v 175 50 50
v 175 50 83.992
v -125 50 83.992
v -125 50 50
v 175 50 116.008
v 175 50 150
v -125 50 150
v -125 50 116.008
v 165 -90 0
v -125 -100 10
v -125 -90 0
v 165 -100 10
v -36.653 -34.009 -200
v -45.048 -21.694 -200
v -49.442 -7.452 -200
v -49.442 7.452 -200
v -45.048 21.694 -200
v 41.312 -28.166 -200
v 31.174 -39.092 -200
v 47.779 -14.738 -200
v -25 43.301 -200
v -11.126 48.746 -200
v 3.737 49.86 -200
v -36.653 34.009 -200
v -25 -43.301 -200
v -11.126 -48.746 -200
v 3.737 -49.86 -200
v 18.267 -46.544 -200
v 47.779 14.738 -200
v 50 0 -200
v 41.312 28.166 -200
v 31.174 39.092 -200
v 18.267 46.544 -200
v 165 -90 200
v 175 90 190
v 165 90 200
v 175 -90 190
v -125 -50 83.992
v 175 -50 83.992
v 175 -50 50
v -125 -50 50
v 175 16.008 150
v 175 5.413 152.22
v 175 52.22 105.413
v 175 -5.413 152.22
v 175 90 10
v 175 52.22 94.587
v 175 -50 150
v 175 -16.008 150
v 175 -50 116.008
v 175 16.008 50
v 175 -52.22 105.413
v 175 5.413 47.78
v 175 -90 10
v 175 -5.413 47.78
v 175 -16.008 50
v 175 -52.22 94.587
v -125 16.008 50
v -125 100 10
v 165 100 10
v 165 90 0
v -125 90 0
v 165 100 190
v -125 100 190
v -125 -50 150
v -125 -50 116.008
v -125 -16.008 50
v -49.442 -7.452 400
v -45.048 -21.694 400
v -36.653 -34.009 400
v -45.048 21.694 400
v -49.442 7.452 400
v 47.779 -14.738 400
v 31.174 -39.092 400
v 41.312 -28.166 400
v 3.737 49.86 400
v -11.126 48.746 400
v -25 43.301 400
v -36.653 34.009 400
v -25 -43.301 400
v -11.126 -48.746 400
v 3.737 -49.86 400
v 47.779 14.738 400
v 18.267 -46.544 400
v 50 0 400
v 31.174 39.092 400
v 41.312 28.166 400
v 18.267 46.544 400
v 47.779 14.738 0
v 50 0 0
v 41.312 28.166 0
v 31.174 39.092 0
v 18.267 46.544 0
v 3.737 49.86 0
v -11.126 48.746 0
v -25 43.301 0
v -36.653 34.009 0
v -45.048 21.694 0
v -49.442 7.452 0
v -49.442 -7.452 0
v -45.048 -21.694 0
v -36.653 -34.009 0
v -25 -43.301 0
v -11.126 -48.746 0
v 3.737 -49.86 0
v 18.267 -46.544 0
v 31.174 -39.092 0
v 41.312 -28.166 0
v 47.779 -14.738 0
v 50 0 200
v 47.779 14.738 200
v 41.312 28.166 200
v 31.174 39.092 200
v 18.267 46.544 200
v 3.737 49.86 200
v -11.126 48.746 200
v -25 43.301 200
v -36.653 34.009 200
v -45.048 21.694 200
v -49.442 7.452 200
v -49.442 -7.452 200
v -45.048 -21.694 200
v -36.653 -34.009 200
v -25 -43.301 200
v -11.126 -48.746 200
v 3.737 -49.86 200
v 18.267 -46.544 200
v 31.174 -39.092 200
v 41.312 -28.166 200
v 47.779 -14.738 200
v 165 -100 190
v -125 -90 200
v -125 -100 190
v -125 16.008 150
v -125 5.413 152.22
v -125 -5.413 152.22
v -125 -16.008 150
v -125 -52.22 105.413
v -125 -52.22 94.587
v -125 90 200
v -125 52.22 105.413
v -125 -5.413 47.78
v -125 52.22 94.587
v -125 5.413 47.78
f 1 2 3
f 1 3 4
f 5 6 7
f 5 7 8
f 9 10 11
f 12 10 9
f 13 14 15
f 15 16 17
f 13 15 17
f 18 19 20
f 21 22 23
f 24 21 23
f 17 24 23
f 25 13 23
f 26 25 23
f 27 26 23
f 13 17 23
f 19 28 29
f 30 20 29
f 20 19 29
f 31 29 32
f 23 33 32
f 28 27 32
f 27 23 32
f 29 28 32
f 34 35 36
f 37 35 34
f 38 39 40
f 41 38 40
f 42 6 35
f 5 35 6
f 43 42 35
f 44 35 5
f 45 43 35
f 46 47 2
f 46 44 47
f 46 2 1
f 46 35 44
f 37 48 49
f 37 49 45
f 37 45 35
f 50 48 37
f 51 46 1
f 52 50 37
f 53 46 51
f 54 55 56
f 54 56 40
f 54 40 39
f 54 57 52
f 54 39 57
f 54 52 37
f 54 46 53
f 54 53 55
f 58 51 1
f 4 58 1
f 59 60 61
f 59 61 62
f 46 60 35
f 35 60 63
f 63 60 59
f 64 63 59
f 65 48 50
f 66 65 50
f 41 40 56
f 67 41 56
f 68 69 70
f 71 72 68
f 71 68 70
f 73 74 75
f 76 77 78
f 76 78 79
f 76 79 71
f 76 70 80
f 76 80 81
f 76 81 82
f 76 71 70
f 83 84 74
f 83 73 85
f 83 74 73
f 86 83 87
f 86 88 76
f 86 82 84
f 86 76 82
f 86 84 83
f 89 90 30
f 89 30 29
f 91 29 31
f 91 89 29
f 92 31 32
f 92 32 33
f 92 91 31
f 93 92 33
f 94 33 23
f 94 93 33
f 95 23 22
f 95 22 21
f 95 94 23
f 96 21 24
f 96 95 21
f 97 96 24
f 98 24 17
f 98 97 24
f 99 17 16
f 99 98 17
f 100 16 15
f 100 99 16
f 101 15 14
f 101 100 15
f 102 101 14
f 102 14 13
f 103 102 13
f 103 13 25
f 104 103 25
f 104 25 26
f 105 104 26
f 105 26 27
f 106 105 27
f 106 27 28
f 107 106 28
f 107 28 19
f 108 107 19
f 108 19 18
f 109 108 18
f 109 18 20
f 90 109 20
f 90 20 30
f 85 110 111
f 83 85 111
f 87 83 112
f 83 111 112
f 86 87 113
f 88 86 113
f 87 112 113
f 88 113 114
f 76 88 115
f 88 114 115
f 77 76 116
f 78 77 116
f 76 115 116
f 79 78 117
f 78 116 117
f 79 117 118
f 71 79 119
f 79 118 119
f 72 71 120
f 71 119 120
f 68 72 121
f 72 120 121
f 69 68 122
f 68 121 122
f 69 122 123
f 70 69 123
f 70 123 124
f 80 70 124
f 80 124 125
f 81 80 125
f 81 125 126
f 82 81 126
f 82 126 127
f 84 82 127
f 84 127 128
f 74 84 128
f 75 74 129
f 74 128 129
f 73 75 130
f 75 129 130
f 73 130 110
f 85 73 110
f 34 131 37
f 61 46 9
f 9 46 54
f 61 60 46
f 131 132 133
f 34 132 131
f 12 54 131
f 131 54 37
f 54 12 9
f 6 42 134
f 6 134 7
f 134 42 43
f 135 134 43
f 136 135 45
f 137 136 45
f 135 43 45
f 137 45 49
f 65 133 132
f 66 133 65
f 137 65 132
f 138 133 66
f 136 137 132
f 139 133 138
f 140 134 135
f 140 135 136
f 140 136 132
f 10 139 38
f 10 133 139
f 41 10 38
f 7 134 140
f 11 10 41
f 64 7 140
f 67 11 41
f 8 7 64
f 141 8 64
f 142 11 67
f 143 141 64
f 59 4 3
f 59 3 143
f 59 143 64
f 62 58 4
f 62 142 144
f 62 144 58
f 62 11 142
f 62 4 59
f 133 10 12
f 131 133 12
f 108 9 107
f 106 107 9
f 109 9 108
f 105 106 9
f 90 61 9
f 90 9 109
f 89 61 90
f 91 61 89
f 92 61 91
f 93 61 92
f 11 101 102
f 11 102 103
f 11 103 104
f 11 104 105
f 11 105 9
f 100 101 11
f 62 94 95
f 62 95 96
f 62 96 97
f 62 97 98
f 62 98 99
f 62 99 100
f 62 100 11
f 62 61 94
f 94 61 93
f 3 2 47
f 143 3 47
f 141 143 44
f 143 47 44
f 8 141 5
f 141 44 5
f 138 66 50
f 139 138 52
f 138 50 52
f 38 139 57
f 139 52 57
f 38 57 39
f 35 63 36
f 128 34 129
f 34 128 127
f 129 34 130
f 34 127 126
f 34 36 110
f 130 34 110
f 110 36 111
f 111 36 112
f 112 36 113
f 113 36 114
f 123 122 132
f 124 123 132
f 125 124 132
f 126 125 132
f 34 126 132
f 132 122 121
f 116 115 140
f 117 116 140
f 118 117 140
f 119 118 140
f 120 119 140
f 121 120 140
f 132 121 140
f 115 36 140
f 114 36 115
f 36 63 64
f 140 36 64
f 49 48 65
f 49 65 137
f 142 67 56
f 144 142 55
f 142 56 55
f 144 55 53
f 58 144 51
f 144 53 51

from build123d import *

# Parameters (mm, degrees)
SALIENTE_EXTRUIR1_DEPTH      = 200
CROQUIS2_R                   = 50
SALIENTE_EXTRUIR2_DEPTH      = 200
SALIENTE_EXTRUIR2_DEPTH_BACK = 400
CROQUIS3_W                   = 100
CROQUIS3_H                   = 100
CORTAR_EXTRUIR1_DEPTH        = 301
CROQUIS4_R                   = 52.5
CORTAR_EXTRUIR2_DEPTH        = 301
CHAFL_N1_SIZE                = 10


with BuildPart() as part:
    # Croquis1 → Saliente-Extruir1 (new body)
    with BuildSketch(Plane.XY):
        Polygon((-125, 100), (125, 100), (175, 100), (175, -100), (125, -100), (-125, -100), align=None)
    extrude(amount=SALIENTE_EXTRUIR1_DEPTH)

    # Croquis2 → Saliente-Extruir2 (add, two sides)
    with BuildSketch(Plane.XY.offset(200)) as saliente_extruir2_sk:
        Circle(CROQUIS2_R)
    extrude(amount=SALIENTE_EXTRUIR2_DEPTH)
    extrude(saliente_extruir2_sk.sketch, amount=-SALIENTE_EXTRUIR2_DEPTH_BACK)

    # Croquis3 → Cortar-Extruir1 (cut, through all)
    with BuildSketch(Plane(origin=(175, 0, 0), x_dir=(0, 0, -1), z_dir=(1, 0, 0))):
        with Locations((-100, 0)):
            Rectangle(CROQUIS3_W, CROQUIS3_H)
    extrude(amount=-CORTAR_EXTRUIR1_DEPTH, mode=Mode.SUBTRACT)

    # Croquis4 → Cortar-Extruir2 (cut, through all)
    with BuildSketch(Plane(origin=(175, 0, 0), x_dir=(0, 0, -1), z_dir=(1, 0, 0))):
        with Locations((-100, 0)):
            Circle(CROQUIS4_R)
    extrude(amount=-CORTAR_EXTRUIR2_DEPTH, mode=Mode.SUBTRACT)

    # Chaflán1
    chafl_n1_edges = [part.edges().sort_by_distance(p)[0] for p in [
        (175, 100, 100),
        (175, -100, 100),
        (25, 100, 200),
        (25, -100, 200),
        (25, -100, 0),
        (25, 100, 0),
        (175, 0, 0),
        (175, 0, 200),
    ]]
    chamfer(chafl_n1_edges, length=CHAFL_N1_SIZE)


solid = part.part
